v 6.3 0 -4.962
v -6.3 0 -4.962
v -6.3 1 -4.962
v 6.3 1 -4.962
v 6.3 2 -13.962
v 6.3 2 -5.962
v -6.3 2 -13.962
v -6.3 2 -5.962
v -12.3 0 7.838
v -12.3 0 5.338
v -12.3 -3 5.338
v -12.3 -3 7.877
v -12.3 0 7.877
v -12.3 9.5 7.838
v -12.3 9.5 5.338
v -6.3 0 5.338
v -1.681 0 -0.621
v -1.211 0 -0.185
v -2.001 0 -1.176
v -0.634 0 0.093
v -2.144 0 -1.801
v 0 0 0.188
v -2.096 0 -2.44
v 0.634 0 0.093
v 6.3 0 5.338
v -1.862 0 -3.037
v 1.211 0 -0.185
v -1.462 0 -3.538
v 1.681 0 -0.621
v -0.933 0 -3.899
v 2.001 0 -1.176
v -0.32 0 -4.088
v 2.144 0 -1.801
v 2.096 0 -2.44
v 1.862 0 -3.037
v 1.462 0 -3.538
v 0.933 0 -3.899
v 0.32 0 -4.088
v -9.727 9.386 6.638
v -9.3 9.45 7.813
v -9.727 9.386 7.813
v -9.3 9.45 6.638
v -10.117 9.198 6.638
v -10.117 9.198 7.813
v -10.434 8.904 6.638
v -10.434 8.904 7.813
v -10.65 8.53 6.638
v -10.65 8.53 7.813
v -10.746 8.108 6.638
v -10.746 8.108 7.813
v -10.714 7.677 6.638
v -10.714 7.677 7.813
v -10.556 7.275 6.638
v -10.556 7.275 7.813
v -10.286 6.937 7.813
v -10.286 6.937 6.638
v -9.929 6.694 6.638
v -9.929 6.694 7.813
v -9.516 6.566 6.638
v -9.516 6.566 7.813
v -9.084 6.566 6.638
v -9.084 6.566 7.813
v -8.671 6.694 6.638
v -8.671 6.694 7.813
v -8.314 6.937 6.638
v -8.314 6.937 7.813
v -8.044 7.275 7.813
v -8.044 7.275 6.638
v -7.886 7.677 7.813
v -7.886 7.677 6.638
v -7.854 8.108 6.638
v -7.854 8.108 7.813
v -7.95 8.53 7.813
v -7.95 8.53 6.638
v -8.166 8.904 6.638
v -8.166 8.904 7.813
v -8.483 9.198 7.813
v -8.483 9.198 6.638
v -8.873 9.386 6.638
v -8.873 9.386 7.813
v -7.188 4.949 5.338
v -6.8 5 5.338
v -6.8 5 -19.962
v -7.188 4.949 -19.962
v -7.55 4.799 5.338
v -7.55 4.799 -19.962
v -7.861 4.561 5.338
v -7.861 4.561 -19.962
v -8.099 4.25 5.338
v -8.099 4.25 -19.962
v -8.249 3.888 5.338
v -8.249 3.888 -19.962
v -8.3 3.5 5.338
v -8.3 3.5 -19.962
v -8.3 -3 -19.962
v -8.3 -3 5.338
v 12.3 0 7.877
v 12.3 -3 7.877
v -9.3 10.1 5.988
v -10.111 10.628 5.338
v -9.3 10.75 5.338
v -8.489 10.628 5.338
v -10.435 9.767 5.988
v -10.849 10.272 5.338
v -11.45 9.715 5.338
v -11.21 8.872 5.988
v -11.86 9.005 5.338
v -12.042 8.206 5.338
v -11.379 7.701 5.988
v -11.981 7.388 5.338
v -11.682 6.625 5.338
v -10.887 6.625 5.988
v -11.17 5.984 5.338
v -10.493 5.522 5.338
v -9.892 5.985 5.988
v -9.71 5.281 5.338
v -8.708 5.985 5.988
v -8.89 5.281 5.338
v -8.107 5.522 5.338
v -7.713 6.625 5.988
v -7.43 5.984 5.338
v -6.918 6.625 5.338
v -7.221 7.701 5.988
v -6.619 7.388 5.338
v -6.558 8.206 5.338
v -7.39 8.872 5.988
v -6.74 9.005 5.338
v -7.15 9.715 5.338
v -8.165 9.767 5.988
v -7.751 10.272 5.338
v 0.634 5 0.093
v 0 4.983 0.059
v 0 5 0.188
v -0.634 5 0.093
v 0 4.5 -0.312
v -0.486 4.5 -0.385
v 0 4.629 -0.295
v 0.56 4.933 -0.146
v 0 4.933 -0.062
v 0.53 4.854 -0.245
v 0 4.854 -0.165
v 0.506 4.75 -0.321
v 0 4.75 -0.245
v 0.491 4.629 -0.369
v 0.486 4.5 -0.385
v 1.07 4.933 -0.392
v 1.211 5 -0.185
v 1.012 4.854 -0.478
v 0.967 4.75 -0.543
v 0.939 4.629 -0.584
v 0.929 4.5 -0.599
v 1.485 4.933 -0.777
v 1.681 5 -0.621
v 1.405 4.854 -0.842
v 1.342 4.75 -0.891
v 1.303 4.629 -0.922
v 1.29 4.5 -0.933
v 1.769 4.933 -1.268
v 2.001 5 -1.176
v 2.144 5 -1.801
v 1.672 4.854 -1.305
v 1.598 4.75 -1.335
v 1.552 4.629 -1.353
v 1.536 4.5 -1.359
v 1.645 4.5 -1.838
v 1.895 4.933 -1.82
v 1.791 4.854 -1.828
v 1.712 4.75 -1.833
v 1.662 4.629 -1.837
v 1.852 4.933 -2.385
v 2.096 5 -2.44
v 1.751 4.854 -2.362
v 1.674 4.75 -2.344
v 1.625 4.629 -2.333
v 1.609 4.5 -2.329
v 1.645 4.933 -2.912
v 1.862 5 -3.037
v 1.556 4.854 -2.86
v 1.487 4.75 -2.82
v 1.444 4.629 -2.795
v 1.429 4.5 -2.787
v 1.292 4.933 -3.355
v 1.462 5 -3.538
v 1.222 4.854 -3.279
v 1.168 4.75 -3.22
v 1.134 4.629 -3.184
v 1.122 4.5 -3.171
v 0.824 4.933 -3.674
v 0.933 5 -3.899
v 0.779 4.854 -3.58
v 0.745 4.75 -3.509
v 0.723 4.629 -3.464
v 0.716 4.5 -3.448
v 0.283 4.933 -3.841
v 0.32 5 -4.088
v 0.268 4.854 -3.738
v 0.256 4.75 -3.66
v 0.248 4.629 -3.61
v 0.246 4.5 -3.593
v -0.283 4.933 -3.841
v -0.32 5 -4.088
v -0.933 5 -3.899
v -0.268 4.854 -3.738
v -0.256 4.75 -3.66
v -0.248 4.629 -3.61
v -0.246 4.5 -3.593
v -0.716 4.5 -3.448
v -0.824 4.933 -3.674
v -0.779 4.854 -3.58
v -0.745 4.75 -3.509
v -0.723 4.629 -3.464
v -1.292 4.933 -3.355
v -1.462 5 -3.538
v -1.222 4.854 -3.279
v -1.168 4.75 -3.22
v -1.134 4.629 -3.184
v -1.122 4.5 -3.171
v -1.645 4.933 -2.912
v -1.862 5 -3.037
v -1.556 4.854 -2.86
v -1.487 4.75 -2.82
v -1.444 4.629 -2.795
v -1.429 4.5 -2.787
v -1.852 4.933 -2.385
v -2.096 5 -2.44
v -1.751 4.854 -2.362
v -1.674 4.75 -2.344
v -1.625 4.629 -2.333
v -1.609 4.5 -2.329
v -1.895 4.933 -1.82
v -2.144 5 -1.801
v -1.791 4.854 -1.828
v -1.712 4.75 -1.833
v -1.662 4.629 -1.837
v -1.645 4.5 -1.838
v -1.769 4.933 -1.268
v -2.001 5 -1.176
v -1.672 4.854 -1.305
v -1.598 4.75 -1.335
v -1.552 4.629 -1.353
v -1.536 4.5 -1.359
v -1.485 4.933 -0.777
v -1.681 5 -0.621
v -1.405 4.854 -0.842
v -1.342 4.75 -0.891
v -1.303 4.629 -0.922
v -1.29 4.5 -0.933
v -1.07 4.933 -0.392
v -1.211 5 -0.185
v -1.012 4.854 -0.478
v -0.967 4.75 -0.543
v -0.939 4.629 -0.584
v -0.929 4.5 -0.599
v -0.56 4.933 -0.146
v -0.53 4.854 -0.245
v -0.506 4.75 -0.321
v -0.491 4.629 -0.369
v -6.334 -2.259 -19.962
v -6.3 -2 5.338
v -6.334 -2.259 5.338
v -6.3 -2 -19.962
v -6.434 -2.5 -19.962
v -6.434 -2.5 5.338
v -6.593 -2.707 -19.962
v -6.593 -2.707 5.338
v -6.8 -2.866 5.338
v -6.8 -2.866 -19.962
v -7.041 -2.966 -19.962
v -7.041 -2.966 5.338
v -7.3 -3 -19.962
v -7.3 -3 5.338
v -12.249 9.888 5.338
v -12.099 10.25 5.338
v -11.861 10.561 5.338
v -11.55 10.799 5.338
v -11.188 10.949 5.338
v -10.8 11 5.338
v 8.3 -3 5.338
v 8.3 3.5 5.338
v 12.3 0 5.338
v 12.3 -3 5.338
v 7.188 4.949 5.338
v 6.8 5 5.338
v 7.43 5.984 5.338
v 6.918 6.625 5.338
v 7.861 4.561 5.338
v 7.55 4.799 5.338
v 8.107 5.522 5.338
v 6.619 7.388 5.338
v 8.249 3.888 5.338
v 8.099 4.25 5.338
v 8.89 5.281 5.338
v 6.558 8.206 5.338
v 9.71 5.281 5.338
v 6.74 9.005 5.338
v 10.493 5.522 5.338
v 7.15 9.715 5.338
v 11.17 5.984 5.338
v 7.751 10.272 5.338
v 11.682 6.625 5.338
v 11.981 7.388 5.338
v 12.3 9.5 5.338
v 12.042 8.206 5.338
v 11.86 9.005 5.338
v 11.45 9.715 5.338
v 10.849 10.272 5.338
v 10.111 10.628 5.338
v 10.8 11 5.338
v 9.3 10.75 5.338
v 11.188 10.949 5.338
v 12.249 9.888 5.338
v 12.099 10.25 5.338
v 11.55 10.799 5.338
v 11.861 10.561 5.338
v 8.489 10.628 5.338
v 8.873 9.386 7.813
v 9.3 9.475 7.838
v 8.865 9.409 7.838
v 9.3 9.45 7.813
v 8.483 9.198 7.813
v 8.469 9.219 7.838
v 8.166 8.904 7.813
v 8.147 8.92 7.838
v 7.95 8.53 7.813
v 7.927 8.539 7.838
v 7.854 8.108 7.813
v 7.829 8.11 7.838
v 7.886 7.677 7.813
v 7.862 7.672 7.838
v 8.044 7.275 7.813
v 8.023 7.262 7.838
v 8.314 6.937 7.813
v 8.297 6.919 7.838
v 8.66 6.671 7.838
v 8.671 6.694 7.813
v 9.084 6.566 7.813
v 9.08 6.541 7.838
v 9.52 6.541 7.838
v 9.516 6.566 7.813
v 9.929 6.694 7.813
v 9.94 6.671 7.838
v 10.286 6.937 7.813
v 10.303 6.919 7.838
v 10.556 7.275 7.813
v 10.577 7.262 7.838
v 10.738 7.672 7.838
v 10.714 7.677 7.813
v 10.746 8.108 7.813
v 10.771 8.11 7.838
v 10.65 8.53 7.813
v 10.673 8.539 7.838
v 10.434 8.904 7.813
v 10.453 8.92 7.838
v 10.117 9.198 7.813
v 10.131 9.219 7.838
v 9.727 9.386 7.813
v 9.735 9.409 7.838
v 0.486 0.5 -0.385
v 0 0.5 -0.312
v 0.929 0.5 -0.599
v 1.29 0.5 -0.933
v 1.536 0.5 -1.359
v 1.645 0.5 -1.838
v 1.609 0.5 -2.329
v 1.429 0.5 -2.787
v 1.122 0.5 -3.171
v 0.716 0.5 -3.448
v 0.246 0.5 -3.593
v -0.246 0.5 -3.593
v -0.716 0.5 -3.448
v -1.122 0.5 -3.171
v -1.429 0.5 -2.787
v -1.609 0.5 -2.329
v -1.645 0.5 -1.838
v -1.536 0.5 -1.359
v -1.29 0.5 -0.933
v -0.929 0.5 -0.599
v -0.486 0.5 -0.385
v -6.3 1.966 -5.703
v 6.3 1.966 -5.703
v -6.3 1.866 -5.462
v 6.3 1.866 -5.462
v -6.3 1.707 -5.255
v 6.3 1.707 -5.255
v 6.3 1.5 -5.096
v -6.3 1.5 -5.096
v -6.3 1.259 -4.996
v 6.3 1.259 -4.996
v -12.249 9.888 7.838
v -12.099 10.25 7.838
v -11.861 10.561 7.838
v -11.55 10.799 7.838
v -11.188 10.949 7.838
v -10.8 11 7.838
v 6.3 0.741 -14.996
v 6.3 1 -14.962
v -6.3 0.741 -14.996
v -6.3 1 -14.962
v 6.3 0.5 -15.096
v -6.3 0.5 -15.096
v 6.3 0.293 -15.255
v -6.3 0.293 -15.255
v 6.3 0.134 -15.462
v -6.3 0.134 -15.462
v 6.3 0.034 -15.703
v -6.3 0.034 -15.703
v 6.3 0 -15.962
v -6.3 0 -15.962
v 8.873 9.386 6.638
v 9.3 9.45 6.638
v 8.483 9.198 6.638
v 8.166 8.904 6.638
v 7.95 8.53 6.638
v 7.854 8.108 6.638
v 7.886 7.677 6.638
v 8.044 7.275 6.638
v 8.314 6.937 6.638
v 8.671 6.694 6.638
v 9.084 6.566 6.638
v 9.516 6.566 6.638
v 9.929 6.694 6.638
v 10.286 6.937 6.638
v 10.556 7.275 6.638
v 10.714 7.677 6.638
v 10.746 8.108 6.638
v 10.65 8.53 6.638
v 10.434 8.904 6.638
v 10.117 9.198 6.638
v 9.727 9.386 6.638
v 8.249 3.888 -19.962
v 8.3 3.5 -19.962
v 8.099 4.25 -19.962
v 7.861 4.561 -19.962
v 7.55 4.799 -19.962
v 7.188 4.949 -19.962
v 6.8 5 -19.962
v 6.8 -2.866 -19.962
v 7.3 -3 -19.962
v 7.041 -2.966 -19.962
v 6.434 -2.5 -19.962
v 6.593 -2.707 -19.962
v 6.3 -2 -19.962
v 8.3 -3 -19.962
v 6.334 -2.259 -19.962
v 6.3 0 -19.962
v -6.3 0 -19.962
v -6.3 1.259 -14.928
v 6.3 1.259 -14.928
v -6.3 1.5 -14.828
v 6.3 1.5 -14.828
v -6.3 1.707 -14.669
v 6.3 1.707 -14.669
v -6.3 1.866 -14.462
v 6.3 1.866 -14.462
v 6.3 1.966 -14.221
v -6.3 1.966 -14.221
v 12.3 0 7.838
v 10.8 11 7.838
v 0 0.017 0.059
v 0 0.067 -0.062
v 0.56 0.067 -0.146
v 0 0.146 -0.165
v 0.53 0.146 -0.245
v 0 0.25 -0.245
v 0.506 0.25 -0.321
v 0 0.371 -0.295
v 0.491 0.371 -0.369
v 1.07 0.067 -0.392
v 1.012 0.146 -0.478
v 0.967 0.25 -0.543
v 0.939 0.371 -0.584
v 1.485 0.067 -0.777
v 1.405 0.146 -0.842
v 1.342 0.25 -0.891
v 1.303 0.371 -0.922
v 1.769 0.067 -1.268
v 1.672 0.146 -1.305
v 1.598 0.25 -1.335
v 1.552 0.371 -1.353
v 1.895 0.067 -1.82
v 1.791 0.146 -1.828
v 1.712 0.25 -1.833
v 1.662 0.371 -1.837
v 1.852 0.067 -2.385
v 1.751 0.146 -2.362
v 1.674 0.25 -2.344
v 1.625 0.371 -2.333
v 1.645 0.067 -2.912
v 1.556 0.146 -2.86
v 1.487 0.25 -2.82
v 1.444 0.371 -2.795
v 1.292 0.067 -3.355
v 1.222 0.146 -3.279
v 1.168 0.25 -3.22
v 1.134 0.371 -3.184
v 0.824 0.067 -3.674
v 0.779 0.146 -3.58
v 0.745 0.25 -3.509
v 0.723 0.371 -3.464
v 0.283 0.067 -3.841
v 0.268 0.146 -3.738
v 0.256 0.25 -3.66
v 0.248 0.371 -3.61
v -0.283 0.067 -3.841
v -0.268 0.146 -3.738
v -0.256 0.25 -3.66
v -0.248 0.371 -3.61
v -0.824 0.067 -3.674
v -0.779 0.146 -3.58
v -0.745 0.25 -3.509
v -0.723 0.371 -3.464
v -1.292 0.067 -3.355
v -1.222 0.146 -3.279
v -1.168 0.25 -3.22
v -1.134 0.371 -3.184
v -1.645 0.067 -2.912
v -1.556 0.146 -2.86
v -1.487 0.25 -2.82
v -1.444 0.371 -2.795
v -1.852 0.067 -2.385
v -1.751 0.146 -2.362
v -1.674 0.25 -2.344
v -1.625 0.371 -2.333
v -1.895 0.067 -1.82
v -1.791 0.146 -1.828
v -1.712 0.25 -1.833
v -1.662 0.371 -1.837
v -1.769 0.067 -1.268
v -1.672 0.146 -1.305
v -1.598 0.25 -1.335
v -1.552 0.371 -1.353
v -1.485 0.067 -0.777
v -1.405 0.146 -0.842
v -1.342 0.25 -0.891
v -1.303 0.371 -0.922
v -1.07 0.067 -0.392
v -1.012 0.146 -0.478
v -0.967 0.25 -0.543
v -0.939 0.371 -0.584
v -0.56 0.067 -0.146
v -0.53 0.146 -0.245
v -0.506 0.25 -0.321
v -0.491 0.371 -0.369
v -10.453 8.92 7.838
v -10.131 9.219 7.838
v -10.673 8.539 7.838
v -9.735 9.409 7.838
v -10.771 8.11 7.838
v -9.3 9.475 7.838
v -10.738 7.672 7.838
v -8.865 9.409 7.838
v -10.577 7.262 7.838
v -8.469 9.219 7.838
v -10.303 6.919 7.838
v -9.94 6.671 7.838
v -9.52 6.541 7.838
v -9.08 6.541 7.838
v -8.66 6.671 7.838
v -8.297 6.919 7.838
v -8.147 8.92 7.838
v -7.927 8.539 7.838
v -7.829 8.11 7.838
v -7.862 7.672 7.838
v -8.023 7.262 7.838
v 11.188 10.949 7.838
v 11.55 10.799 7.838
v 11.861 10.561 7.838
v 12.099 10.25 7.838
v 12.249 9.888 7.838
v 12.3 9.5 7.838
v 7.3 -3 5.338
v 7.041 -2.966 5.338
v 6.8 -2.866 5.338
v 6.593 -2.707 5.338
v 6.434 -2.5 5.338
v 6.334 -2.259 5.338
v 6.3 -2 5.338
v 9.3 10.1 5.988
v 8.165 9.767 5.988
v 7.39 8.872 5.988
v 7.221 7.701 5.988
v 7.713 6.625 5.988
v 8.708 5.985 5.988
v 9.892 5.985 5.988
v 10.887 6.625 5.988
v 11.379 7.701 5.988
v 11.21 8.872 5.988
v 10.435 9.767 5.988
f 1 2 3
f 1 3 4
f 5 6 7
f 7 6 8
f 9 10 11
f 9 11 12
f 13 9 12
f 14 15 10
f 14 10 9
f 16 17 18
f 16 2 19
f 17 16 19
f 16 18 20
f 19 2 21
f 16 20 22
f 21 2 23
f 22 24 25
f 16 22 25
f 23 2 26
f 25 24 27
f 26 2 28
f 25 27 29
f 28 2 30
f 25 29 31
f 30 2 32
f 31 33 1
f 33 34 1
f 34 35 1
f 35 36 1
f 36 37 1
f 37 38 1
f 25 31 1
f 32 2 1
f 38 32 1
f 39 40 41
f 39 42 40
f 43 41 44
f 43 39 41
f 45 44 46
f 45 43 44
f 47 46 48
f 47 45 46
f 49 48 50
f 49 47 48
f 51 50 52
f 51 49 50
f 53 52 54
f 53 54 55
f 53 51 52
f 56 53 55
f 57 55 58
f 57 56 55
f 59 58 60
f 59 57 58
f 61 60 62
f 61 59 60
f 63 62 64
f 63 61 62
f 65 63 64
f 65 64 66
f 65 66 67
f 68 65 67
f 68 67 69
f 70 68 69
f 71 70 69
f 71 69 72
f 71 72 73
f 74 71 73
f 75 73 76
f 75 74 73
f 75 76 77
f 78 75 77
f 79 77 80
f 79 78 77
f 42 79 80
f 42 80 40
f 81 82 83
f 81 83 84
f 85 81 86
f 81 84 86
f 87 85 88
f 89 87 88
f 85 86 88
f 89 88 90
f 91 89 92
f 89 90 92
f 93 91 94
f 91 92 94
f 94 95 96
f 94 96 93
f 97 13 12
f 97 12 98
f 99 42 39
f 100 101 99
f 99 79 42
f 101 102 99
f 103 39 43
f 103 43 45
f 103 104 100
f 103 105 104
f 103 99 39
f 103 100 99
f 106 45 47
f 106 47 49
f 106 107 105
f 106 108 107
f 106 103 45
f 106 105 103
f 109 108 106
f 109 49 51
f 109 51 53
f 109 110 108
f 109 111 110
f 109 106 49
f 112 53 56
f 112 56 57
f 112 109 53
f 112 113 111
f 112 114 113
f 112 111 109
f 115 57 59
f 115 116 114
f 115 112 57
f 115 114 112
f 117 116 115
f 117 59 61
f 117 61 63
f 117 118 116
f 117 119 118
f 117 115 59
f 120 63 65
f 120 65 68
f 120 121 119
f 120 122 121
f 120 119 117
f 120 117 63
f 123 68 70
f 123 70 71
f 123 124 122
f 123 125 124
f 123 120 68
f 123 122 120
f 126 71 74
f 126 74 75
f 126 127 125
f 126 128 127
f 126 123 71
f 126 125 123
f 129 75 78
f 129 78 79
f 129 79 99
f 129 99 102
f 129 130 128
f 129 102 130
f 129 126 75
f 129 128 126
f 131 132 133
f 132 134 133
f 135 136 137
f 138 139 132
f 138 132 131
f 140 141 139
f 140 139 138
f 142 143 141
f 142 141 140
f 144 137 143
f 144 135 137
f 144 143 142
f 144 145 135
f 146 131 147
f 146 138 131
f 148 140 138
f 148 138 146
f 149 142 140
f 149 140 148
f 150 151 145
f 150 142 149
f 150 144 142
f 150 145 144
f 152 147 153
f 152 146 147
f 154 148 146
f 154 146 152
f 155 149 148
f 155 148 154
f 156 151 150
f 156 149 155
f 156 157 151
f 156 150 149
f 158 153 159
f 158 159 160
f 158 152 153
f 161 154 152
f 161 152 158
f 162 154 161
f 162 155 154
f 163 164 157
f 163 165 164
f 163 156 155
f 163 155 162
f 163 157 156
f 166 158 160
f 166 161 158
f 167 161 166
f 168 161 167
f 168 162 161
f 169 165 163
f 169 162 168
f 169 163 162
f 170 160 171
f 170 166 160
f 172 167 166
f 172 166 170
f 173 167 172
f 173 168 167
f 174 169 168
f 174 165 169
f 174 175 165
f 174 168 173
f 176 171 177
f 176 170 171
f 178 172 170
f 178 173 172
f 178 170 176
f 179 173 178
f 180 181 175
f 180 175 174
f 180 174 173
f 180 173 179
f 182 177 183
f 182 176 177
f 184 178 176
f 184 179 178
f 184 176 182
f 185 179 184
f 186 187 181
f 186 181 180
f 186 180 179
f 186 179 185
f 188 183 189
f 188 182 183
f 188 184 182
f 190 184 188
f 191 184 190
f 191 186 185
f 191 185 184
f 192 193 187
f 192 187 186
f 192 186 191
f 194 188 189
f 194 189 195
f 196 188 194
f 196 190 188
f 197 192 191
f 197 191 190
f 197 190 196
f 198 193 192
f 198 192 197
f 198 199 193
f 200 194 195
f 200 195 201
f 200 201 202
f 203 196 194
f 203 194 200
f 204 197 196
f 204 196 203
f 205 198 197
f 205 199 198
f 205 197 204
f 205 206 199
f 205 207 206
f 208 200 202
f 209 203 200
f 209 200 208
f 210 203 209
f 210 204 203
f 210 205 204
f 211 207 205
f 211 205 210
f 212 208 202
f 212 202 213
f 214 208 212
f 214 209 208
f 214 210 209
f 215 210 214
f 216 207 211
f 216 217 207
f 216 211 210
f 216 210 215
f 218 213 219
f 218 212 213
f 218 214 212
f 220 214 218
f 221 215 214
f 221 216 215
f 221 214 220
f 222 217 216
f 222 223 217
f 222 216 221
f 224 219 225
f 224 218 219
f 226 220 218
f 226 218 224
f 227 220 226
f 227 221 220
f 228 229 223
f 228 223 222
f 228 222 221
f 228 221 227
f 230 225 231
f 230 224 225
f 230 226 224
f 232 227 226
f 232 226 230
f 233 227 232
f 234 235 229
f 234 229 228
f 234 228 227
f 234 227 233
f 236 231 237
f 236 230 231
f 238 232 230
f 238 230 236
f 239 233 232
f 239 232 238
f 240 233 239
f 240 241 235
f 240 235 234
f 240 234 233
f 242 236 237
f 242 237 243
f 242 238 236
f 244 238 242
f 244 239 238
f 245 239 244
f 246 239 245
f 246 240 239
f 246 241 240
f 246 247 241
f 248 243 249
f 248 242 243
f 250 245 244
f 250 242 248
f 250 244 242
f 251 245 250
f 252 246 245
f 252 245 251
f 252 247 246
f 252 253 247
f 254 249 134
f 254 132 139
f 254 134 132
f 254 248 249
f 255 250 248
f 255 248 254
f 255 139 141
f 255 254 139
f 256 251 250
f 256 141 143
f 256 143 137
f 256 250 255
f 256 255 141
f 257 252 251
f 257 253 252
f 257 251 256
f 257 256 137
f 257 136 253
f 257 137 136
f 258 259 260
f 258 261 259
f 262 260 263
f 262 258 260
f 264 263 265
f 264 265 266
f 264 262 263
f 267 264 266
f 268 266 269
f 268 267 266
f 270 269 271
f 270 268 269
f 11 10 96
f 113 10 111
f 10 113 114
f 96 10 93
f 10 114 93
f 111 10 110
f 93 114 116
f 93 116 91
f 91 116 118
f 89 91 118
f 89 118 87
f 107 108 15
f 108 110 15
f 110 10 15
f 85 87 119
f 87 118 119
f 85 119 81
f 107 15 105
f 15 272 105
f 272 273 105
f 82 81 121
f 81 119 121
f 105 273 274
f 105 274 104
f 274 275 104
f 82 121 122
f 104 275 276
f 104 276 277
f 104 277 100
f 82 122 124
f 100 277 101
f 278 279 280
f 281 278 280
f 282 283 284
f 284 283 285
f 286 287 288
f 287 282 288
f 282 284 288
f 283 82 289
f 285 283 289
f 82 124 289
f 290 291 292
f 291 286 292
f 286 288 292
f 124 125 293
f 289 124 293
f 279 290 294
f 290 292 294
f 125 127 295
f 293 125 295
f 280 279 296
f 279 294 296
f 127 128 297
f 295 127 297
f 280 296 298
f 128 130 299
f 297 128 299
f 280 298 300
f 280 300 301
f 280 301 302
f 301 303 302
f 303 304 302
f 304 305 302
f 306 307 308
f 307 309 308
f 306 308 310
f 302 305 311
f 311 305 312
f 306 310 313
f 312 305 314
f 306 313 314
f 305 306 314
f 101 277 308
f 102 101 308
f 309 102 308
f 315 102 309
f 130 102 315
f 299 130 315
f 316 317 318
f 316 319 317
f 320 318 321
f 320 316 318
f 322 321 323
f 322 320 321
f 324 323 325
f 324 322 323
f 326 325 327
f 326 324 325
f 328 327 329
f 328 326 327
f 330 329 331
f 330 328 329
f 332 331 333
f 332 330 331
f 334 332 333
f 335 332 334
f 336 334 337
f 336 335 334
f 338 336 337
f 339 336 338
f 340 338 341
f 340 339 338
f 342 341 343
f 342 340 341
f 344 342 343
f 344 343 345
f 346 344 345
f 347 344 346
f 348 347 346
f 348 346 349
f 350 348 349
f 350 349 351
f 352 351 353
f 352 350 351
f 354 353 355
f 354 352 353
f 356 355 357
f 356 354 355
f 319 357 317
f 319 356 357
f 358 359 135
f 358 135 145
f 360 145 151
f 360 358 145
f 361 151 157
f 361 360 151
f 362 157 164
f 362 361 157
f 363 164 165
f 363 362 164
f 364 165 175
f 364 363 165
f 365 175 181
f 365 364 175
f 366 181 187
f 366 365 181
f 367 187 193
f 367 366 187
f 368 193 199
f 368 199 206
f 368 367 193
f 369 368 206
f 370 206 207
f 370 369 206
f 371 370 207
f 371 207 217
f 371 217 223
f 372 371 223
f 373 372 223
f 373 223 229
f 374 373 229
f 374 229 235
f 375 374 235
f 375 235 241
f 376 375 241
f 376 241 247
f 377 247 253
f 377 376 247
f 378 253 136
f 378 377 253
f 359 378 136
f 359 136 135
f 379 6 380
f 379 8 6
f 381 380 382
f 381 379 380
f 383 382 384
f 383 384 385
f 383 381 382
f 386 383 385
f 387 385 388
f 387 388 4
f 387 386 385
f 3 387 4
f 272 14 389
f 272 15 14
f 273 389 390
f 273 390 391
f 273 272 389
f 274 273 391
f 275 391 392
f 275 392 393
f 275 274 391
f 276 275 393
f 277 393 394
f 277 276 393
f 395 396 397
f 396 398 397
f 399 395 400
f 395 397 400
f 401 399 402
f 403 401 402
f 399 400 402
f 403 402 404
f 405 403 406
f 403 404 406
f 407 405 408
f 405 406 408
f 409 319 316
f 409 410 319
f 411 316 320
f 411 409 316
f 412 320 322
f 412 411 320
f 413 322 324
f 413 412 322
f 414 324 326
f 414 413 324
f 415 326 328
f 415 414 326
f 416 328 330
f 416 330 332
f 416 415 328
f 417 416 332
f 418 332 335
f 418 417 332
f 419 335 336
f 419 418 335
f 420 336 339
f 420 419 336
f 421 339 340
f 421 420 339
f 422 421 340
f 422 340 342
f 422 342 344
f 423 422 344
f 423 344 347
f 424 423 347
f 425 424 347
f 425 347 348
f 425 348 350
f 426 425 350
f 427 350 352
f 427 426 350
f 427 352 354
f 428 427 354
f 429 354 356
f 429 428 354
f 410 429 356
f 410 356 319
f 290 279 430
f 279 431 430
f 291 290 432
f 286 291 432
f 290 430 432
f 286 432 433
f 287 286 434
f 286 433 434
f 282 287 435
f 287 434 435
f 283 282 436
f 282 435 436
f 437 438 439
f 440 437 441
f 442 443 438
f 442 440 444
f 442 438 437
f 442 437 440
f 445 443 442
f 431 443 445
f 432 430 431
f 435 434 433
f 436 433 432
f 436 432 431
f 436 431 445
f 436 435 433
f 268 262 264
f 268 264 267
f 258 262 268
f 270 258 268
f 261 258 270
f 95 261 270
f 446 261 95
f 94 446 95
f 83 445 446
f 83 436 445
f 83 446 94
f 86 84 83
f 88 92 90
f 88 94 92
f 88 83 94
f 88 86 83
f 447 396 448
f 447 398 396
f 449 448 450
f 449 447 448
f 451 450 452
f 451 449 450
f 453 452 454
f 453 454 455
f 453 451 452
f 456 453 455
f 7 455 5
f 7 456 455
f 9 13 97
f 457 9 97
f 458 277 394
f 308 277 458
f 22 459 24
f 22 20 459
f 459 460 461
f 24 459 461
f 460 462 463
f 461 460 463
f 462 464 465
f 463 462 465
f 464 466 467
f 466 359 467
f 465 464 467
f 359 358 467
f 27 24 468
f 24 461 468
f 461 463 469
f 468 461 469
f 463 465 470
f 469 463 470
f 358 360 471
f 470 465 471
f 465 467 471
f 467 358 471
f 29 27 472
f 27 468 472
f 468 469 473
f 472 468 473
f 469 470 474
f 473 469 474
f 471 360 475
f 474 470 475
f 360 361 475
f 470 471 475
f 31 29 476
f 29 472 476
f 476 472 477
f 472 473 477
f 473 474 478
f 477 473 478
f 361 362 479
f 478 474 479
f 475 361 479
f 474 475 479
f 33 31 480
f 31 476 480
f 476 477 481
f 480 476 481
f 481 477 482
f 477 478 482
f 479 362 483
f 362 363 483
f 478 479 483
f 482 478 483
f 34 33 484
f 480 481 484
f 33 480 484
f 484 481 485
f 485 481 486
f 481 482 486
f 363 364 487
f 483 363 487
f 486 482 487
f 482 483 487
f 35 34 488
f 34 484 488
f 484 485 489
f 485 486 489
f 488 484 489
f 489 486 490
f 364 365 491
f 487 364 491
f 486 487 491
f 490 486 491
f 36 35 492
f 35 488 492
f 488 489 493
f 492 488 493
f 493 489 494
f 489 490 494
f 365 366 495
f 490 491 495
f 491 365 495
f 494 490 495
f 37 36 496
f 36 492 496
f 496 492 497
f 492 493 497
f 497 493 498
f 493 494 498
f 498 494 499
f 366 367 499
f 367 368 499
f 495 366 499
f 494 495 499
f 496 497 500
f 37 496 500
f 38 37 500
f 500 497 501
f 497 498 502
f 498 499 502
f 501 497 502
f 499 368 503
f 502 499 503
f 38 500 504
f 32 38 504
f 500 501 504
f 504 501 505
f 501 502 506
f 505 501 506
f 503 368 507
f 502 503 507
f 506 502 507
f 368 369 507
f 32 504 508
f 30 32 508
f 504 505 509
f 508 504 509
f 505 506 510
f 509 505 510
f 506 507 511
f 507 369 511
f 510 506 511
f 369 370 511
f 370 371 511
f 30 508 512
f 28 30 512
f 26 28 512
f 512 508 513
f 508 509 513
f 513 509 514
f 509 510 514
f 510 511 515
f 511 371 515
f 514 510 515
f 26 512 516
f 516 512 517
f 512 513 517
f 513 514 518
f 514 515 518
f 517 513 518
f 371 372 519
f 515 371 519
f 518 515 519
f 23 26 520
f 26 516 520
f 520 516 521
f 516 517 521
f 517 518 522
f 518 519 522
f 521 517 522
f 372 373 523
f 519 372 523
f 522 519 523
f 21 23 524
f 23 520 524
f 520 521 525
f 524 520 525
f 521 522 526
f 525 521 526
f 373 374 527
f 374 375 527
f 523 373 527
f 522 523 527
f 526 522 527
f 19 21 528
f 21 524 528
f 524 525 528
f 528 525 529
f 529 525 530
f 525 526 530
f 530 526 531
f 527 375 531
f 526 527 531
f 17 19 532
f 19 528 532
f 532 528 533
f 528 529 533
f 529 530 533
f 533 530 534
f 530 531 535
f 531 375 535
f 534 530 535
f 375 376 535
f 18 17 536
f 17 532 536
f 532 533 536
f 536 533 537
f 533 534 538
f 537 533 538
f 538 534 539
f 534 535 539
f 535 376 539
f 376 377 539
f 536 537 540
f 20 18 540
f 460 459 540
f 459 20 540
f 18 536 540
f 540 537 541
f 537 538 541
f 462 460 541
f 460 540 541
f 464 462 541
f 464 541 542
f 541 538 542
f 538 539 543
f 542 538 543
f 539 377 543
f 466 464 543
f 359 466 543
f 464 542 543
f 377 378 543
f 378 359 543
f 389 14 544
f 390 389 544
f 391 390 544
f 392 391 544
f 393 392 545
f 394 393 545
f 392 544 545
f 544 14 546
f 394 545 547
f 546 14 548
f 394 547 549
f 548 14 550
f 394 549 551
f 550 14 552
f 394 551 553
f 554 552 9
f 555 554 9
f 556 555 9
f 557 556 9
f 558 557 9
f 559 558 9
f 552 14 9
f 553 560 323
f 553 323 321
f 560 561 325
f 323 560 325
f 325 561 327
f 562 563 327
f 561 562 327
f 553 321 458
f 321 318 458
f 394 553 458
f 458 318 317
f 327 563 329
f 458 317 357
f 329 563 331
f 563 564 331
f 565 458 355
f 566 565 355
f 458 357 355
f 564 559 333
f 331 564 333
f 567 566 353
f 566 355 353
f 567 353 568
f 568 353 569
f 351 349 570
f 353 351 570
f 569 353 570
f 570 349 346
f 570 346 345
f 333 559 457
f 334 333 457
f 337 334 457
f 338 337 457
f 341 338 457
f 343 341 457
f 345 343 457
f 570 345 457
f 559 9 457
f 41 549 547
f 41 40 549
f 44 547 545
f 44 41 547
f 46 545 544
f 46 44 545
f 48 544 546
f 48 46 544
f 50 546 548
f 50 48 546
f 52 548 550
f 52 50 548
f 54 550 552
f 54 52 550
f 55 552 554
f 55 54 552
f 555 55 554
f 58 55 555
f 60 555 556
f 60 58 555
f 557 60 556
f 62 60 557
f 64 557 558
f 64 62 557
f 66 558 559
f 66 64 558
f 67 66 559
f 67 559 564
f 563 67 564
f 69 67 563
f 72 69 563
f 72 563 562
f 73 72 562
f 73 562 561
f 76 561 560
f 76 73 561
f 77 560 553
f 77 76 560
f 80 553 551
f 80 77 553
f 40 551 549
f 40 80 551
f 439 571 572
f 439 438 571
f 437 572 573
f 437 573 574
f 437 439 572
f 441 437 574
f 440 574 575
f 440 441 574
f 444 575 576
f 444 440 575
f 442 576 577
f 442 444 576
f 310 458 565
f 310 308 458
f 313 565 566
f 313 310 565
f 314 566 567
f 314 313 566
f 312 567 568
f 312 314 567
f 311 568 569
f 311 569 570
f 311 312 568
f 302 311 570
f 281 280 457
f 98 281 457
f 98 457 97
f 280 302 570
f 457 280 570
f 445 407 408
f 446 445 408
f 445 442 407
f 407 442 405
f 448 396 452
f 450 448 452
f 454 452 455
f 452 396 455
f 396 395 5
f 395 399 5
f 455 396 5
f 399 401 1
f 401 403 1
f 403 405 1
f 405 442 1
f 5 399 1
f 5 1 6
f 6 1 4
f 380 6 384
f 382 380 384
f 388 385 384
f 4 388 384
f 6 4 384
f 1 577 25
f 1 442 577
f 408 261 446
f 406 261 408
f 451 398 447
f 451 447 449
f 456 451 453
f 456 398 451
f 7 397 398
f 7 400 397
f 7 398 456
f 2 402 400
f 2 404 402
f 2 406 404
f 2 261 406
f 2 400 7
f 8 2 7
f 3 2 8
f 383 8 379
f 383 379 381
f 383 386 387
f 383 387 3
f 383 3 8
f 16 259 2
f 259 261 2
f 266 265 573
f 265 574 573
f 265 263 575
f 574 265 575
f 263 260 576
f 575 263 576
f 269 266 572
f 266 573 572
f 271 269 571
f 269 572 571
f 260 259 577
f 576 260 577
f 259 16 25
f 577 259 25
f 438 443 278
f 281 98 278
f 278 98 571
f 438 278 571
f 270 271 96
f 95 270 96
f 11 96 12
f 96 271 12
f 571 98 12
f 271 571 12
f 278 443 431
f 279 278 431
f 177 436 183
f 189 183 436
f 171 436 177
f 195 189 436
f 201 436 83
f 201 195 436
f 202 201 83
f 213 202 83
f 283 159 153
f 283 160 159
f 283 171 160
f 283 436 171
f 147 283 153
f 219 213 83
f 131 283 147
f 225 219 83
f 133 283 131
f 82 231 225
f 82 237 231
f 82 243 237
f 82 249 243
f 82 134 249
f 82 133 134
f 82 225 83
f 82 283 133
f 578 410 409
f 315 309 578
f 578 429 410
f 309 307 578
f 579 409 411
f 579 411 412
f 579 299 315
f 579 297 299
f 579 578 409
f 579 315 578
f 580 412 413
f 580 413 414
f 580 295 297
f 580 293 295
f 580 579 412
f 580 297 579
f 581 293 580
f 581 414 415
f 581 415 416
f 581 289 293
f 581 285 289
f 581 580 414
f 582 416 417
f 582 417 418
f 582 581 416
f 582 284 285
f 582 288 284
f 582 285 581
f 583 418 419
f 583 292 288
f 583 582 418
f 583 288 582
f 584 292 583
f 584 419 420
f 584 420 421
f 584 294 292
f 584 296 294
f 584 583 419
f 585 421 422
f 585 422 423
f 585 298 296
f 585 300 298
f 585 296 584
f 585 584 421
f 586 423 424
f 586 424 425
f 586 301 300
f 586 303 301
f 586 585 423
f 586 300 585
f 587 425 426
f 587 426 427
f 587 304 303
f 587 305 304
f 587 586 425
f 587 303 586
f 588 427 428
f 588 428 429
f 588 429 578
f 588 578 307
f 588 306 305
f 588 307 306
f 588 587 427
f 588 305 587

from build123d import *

# Parameters (mm, degrees)
ESQUISSE1_W                                  = 12.6
ESQUISSE1_H                                  = 12.8
ESQUISSE1_R                                  = 1.65
BOSS_EXTRU_1_DEPTH                           = 5
BOSS_EXTRU_3_DEPTH                           = 6
BOSS_EXTRU_3_DEPTH_BACK                      = 5
ESQUISSE2_W                                  = 24.6
ESQUISSE2_H                                  = 2.5
FRAISAGE_POUR_VIS_T_TE_FRAIS_E_M2_51_A_COUNT = 2
FRAISAGE_POUR_VIS_T_TE_FRAIS_E_M2_51_A_PITCH = 18.6
CONG_3_R                                     = 0.5
ESQUISSE6_W                                  = 12.6
ESQUISSE6_H                                  = 3
BOSS_EXTRU_4_DEPTH                           = 10
ESQUISSE7_W                                  = 12.6
ESQUISSE7_H                                  = 5
BOSS_EXTRU_5_DEPTH                           = 5
ESQUISSE9_W                                  = 24.6
ESQUISSE9_H                                  = 2.538668555
BOSS_EXTRU_6_DEPTH                           = 3
ESQUISSE11_W                                 = 2
ESQUISSE11_H                                 = 8
BOSS_EXTRU_7_DEPTH                           = 25.3
CONG_4_R                                     = 1
CONG_5_R                                     = 1
CONG_6_R                                     = 1.5
CONG_7_R                                     = 1.5


with BuildPart() as part:
    # Esquisse1 → Boss.-Extru.1 (new body)
    with BuildSketch(Plane(origin=(0, 0, 0), x_dir=(1, 0, 0), z_dir=(0, 1, 0))):
        with Locations((0, -1.438202247)):
            Rectangle(ESQUISSE1_W, ESQUISSE1_H)
        with Locations(Location((0, 1.961797753, 0), (0, 0, 270))):
            Circle(ESQUISSE1_R, mode=Mode.SUBTRACT)
    extrude(amount=BOSS_EXTRU_1_DEPTH)

    # Esquisse2 → Boss.-Extru.3 (add, two sides: drawn at the far end of the back side and taken through both)
    with BuildSketch(Plane(origin=(0, 5, 0), x_dir=(1, 0, 0), z_dir=(0, 1, 0)).offset(-BOSS_EXTRU_3_DEPTH_BACK)):
        with Locations((0, -6.588202247)):
            Rectangle(ESQUISSE2_W, ESQUISSE2_H)
    extrude(amount=BOSS_EXTRU_3_DEPTH + BOSS_EXTRU_3_DEPTH_BACK)

    # Esquisse5 → Fraisage pour vis à tête fraisée M2.51 (revolve, cut)
    with BuildSketch(Plane(origin=(-9.3, 8, 5.338202247), x_dir=(0, 1, 0), z_dir=(1, 0, 0))):
        Polygon((0, 0), (0, 2.5), (1.475, 2.5), (1.45, 2.475), (1.45, 1.3), (2.75, 0), align=None)
    fraisage_pour_vis_t_te_frais_e_m2_51 = revolve(axis=Axis((-9.3, 8, -1.011797753), (0, 0, 1)), mode=Mode.SUBTRACT)

    # Fraisage pour vis à tête fraisée M2.51 a: Fraisage pour vis à tête fraisée M2.51 ×2
    with Locations(*[(i * FRAISAGE_POUR_VIS_T_TE_FRAIS_E_M2_51_A_PITCH, 0, 0) for i in range(1, FRAISAGE_POUR_VIS_T_TE_FRAIS_E_M2_51_A_COUNT)]):
        add(fraisage_pour_vis_t_te_frais_e_m2_51, mode=Mode.SUBTRACT)

    # Congé3
    cong_3_edges = [part.edges().sort_by_distance(p)[0] for p in [
        (0, 0, -3.611797753),
        (0, 5, -3.611797753),
    ]]
    fillet(cong_3_edges, radius=CONG_3_R)

    # Esquisse6 → Boss.-Extru.4 (add)
    with BuildSketch(Plane(origin=(0, 0, -4.961797753), x_dir=(-1, 0, 0), z_dir=(0, 0, -1))):
        with Locations((0, 3.5)):
            Rectangle(ESQUISSE6_W, ESQUISSE6_H)
    extrude(amount=BOSS_EXTRU_4_DEPTH)

    # Esquisse7 → Boss.-Extru.5 (add)
    with BuildSketch(Plane(origin=(0, 0, -14.961797753), x_dir=(-1, 0, 0), z_dir=(0, 0, -1))):
        with Locations((0, 2.5)):
            Rectangle(ESQUISSE7_W, ESQUISSE7_H)
    extrude(amount=BOSS_EXTRU_5_DEPTH)

    # Esquisse9 → Boss.-Extru.6 (add)
    with BuildSketch(Plane.XZ):
        with Locations((0, 6.607536525)):
            Rectangle(ESQUISSE9_W, ESQUISSE9_H)
    extrude(amount=BOSS_EXTRU_6_DEPTH)

    # Esquisse11 → Boss.-Extru.7 (add)
    with BuildSketch(Plane(origin=(0, 0, 5.338202247), x_dir=(-1, 0, 0), z_dir=(0, 0, -1))):
        with Locations((-7.3, 1)):
            Rectangle(ESQUISSE11_W, ESQUISSE11_H)
        with Locations((7.3, 1)):
            Rectangle(ESQUISSE11_W, ESQUISSE11_H)
    extrude(amount=BOSS_EXTRU_7_DEPTH)

    # Congé4
    cong_4_edges = [part.edges().sort_by_distance(p)[0] for p in [
        (0, 0, -14.961797753),
        (0, 2, -14.961797753),
        (0, 2, -4.961797753),
    ]]
    fillet(cong_4_edges, radius=CONG_4_R - 0.0001)  # a hair under: the kernel refuses the full size

    # Congé5
    cong_5_edges = [part.edges().sort_by_distance(p)[0] for p in [
        (6.3, -3, -7.311797753),
        (-6.3, -3, -7.311797753),
    ]]
    fillet(cong_5_edges, radius=CONG_5_R)

    # Congé6
    cong_6_edges = [part.edges().sort_by_distance(p)[0] for p in [
        (8.3, 5, -7.311797753),
        (-8.3, 5, -7.311797753),
    ]]
    fillet(cong_6_edges, radius=CONG_6_R)

    # Congé7
    cong_7_edges = [part.edges().sort_by_distance(p)[0] for p in [
        (-12.3, 11, 6.588202247),
        (12.3, 11, 6.588202247),
    ]]
    fillet(cong_7_edges, radius=CONG_7_R)


solid = part.part
